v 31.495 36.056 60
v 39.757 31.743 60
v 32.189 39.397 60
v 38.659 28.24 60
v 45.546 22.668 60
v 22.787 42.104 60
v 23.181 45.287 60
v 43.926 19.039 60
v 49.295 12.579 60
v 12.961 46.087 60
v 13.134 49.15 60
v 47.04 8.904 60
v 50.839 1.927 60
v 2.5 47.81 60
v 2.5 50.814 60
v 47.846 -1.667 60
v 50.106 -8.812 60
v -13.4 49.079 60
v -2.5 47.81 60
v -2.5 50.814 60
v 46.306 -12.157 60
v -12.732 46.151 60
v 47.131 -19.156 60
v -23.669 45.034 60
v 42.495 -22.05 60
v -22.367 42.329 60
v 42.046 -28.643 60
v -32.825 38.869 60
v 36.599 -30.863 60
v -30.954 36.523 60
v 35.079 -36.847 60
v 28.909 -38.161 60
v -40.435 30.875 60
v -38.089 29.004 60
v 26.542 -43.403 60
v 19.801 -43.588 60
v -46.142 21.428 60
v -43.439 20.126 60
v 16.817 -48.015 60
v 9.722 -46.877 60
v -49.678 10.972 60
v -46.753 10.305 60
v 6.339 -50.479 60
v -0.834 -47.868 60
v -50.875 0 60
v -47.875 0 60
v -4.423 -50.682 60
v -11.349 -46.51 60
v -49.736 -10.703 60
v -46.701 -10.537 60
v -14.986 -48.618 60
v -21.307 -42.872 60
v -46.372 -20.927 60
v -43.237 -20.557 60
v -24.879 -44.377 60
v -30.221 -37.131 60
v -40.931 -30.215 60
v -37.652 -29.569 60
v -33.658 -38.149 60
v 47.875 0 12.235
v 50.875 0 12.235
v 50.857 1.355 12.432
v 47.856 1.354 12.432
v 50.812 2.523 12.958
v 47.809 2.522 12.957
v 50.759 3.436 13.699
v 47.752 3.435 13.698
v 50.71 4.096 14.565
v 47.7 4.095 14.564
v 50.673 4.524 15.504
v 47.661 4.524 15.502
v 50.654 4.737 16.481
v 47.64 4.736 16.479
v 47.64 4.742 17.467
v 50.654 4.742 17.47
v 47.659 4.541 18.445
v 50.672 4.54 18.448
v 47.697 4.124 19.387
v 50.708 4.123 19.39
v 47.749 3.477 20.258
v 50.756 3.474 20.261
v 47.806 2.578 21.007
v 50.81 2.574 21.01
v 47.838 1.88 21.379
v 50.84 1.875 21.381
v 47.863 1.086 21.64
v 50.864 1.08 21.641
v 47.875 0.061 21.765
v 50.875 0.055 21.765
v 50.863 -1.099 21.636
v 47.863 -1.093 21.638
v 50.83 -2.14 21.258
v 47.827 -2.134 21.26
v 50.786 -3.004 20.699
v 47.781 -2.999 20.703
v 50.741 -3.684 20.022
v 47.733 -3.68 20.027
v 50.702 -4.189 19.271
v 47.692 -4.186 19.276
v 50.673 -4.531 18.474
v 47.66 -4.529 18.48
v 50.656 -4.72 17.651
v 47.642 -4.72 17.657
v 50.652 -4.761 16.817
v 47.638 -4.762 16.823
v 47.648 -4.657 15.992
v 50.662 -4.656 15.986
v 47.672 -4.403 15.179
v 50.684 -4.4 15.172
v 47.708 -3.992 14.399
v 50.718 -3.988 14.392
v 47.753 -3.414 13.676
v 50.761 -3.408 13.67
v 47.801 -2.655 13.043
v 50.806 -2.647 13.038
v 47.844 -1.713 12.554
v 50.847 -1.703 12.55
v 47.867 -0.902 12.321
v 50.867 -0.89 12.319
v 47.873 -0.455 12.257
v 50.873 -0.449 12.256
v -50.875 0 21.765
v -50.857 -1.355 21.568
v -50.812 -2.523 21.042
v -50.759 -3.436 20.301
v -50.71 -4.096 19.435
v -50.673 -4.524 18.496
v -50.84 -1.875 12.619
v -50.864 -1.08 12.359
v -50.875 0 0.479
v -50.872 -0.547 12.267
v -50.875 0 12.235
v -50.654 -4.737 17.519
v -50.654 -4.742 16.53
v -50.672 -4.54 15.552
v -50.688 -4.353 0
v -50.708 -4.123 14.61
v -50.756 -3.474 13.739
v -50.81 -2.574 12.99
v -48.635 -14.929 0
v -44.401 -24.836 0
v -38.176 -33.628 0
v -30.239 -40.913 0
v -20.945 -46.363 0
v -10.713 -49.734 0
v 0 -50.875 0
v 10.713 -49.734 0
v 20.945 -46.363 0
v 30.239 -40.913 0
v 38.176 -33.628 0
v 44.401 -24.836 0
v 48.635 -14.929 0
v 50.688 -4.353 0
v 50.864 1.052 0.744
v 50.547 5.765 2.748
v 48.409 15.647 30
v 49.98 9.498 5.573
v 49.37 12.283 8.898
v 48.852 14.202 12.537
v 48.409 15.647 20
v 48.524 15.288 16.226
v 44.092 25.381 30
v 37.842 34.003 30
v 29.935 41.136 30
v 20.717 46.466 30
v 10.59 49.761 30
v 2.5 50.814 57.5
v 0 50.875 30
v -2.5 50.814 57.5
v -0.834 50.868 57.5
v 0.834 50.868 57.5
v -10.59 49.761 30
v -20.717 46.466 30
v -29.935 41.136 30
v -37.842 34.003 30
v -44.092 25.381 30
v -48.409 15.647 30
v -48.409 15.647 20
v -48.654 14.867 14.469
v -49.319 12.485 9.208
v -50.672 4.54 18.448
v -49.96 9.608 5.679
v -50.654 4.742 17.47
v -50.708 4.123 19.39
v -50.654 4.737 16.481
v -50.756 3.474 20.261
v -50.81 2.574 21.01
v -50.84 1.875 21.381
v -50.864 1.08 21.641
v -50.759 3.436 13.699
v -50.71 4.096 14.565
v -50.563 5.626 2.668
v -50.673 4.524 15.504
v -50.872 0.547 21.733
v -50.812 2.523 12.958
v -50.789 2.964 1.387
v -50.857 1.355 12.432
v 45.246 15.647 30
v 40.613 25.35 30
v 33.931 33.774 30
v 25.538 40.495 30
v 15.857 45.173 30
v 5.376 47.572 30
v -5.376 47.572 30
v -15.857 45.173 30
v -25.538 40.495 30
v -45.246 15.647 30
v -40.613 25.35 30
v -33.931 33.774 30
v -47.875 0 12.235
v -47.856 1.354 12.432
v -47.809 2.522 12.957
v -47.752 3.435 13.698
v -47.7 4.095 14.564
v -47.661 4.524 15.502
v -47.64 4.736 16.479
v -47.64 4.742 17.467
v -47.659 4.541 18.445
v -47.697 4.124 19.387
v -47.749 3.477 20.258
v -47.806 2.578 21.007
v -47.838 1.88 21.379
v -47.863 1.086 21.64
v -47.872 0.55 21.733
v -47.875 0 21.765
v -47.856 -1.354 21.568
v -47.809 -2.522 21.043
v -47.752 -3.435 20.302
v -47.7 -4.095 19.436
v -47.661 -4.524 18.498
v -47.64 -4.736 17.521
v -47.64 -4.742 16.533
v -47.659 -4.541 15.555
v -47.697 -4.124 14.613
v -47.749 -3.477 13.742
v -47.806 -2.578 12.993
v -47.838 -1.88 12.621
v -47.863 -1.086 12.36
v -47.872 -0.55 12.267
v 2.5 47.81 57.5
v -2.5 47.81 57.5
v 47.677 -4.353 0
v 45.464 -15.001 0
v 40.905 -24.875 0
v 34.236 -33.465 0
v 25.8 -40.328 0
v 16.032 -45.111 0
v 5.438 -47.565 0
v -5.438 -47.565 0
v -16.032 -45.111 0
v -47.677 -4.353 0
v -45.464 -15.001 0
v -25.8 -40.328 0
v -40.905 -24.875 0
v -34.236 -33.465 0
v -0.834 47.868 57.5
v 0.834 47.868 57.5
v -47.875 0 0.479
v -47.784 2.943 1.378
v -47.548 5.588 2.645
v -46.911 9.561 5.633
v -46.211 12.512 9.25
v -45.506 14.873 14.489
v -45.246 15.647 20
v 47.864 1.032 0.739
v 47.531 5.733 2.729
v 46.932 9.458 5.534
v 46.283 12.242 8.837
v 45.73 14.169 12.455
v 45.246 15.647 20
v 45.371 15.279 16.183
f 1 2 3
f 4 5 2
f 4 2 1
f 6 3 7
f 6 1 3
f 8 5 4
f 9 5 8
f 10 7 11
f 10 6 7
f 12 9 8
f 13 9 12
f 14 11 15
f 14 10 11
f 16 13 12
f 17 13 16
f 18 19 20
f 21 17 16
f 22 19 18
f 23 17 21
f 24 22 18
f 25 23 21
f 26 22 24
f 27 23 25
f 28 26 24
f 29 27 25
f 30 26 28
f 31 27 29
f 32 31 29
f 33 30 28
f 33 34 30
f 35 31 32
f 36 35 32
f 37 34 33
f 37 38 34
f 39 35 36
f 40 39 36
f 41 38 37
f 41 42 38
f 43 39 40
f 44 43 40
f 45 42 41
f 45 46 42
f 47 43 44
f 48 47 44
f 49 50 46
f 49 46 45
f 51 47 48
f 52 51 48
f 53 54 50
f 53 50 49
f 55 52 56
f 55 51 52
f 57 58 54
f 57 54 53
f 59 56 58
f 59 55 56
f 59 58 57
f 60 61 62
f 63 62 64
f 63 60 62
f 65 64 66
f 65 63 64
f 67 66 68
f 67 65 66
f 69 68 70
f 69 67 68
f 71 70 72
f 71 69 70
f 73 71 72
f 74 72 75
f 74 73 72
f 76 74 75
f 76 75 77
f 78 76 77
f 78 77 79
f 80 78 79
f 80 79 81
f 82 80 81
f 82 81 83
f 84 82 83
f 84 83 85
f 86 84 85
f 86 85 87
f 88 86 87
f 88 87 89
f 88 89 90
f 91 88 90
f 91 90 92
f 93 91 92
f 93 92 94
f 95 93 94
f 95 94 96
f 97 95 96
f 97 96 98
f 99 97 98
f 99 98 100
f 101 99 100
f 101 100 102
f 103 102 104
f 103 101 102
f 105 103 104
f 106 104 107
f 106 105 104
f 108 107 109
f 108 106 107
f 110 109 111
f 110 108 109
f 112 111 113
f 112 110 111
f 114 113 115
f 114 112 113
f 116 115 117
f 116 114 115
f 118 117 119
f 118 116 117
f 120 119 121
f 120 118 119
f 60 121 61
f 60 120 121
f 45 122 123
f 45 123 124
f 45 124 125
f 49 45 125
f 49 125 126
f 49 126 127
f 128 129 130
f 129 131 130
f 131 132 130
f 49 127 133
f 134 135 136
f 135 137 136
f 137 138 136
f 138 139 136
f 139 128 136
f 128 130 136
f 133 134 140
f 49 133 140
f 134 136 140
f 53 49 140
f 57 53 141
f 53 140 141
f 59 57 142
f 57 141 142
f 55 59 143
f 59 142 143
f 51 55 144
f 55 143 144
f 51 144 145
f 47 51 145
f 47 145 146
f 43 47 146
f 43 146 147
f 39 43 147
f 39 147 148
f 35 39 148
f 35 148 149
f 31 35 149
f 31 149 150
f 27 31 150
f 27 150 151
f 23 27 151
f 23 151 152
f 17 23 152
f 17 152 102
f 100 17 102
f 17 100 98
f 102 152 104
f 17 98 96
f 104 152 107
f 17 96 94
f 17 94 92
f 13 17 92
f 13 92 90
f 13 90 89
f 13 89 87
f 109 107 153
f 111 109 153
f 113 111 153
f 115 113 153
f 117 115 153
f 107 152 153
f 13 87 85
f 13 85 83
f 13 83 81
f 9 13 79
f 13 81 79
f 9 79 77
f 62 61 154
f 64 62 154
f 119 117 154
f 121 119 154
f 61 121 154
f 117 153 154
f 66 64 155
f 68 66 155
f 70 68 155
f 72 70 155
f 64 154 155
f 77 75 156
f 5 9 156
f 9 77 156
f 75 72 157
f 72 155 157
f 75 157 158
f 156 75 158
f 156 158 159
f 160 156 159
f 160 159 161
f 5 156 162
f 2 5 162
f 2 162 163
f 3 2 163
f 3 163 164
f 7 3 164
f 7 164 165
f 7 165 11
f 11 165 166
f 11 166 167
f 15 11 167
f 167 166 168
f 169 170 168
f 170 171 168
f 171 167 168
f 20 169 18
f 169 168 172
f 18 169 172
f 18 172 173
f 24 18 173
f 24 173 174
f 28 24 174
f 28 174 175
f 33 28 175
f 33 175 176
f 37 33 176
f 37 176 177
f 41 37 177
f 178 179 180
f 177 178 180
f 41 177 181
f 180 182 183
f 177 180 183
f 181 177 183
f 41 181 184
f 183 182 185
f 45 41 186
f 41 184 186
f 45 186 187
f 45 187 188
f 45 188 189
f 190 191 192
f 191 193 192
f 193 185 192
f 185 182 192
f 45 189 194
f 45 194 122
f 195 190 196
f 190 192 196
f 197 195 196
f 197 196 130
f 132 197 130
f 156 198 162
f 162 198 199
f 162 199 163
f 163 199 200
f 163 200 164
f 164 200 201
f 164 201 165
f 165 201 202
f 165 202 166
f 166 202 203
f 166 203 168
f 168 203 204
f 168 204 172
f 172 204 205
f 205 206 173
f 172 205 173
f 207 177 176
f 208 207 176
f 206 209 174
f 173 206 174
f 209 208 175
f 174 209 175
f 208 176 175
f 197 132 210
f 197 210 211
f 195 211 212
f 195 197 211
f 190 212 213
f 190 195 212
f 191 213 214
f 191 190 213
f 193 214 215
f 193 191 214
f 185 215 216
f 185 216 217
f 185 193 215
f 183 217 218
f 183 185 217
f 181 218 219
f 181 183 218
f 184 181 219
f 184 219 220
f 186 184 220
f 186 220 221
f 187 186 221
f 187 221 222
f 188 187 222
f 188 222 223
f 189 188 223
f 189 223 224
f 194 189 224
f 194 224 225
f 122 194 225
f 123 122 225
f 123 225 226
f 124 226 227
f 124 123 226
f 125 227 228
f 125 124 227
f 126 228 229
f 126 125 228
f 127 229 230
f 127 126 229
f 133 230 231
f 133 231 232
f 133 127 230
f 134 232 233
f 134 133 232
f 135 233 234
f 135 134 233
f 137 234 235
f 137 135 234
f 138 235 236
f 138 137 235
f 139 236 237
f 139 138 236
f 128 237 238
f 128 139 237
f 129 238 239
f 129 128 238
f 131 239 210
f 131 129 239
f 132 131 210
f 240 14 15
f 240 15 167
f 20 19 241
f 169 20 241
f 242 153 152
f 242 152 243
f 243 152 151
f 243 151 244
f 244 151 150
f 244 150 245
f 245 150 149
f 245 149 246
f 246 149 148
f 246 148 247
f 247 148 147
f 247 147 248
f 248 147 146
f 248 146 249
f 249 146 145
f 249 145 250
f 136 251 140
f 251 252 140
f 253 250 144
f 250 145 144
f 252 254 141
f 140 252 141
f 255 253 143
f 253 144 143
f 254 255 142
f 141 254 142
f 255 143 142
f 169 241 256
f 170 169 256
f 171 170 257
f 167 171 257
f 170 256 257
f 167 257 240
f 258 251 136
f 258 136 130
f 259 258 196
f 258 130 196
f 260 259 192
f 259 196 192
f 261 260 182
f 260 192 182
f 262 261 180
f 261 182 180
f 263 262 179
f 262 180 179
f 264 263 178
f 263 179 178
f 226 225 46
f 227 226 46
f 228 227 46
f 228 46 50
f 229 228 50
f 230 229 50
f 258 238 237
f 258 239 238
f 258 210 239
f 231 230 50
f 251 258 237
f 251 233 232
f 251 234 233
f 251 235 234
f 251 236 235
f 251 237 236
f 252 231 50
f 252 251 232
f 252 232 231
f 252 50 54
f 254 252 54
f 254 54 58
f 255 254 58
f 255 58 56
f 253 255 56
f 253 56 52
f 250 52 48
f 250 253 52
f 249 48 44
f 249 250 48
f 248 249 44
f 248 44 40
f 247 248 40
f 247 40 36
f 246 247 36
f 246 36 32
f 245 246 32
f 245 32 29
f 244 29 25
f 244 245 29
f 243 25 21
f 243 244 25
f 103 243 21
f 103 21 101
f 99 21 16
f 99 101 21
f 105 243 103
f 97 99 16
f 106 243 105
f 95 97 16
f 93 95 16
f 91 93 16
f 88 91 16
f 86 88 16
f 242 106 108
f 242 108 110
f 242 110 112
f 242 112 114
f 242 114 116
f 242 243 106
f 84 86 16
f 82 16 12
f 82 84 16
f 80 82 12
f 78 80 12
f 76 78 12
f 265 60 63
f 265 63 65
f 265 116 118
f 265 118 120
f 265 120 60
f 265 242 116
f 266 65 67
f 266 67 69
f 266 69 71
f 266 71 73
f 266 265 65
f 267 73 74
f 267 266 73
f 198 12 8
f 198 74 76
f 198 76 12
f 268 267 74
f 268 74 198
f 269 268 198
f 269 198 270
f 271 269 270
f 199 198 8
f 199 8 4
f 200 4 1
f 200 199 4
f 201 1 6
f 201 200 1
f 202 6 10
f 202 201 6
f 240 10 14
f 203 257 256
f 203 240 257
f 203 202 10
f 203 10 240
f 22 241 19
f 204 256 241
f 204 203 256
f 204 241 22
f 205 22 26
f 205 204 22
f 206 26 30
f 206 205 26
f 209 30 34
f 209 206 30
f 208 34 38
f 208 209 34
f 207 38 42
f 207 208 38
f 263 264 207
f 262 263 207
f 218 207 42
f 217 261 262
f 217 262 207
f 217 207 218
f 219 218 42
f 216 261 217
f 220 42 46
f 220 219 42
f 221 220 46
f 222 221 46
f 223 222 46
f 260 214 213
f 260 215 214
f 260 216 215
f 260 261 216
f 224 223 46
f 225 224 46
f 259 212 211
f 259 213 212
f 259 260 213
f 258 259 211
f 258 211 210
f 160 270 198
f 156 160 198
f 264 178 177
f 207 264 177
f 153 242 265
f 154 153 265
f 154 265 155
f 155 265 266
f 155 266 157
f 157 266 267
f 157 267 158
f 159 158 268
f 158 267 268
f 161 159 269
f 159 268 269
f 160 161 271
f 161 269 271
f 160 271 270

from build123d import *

# Parameters (mm, degrees)
SKETCH2_R               = 50.875
SKETCH2_R_2             = 47.875
BOSS_EXTRUDE1_DEPTH     = 60
CUT_EXTRUDE2_DEPTH      = 60
CUT_EXTRUDE2_DEPTH_BACK = 60
SKETCH3_OUTSIDE_W       = 93.18
SKETCH3_OUTSIDE_H       = 134.93
CUT_EXTRUDE3_DEPTH      = 94.683142827
CUT_EXTRUDE3_DEPTH_BACK = 94.683142827
SKETCH4_R               = 4.765
FILLET1_R               = 20
SKETCH5_W               = 5
SKETCH5_H               = 5
CUT_EXTRUDE4_DEPTH      = 60


with BuildPart() as part:
    # Sketch2 → Boss-Extrude1 (new body)
    with BuildSketch(Plane.XY):
        with Locations(Location((0, 0, 0), (0, 0, 180))):
            Circle(SKETCH2_R)
        with Locations(Location((0, 0, 0), (0, 0, 180))):
            Circle(SKETCH2_R_2, mode=Mode.SUBTRACT)
    extrude(amount=BOSS_EXTRUDE1_DEPTH)

    # Sketch3 outside → Cut-Extrude2 (cut, two sides: drawn at the far end of the back side and taken through both)
    with BuildSketch(Plane(origin=(0, 0, 0), x_dir=(0, 0, -1), z_dir=(1, 0, 0)).offset(-CUT_EXTRUDE2_DEPTH_BACK)):
        with Locations((-30, 0)):
            Rectangle(SKETCH3_OUTSIDE_W, SKETCH3_OUTSIDE_H)
        Polygon((-60, 50.875), (-60, -50.875), (0, -50.875), (0, 15.646937383), (-30, 15.646937383), (-30, 50.875), align=None, mode=Mode.SUBTRACT)
    extrude(amount=CUT_EXTRUDE2_DEPTH + CUT_EXTRUDE2_DEPTH_BACK, mode=Mode.SUBTRACT)

    # Sketch4 → Cut-Extrude3 (cut, two sides: drawn at the far end of the back side and taken through both)
    with BuildSketch(Plane(origin=(0, 0, 0), x_dir=(0, 0, -1), z_dir=(1, 0, 0)).offset(-CUT_EXTRUDE3_DEPTH_BACK)):
        with Locations((-17, 0)):
            Circle(SKETCH4_R)
    extrude(amount=CUT_EXTRUDE3_DEPTH + CUT_EXTRUDE3_DEPTH_BACK, mode=Mode.SUBTRACT)

    # Fillet1
    # the kernel refuses this fillet: 20 mm, written as the material it takes off along each edge
    with BuildSketch(Plane(origin=(-4.75412753, 15.646937383, 0), x_dir=(0, -1, 0), z_dir=(1, 0, 0)), Plane(origin=(-98.409079474, 15.646937383, 0), x_dir=(0, -1, 0), z_dir=(1, 0, 0))) as fillet1_piece_1:
        with BuildLine():
            CenterArc((FILLET1_R, -FILLET1_R), FILLET1_R, 90, 90)
            Line((0, -FILLET1_R), (0, 0))
            Line((0, 0), (FILLET1_R, 0))
        make_face()
    extrude(amount=103.163207005, mode=Mode.SUBTRACT)

    # Sketch5 → Cut-Extrude4 (cut)
    with BuildSketch(Plane(origin=(0, 0, 0), x_dir=(1, 0, 0), z_dir=(0, 1, 0))):
        with Locations((0, -60)):
            Rectangle(SKETCH5_W, SKETCH5_H)
    extrude(amount=CUT_EXTRUDE4_DEPTH, mode=Mode.SUBTRACT)


solid = part.part
